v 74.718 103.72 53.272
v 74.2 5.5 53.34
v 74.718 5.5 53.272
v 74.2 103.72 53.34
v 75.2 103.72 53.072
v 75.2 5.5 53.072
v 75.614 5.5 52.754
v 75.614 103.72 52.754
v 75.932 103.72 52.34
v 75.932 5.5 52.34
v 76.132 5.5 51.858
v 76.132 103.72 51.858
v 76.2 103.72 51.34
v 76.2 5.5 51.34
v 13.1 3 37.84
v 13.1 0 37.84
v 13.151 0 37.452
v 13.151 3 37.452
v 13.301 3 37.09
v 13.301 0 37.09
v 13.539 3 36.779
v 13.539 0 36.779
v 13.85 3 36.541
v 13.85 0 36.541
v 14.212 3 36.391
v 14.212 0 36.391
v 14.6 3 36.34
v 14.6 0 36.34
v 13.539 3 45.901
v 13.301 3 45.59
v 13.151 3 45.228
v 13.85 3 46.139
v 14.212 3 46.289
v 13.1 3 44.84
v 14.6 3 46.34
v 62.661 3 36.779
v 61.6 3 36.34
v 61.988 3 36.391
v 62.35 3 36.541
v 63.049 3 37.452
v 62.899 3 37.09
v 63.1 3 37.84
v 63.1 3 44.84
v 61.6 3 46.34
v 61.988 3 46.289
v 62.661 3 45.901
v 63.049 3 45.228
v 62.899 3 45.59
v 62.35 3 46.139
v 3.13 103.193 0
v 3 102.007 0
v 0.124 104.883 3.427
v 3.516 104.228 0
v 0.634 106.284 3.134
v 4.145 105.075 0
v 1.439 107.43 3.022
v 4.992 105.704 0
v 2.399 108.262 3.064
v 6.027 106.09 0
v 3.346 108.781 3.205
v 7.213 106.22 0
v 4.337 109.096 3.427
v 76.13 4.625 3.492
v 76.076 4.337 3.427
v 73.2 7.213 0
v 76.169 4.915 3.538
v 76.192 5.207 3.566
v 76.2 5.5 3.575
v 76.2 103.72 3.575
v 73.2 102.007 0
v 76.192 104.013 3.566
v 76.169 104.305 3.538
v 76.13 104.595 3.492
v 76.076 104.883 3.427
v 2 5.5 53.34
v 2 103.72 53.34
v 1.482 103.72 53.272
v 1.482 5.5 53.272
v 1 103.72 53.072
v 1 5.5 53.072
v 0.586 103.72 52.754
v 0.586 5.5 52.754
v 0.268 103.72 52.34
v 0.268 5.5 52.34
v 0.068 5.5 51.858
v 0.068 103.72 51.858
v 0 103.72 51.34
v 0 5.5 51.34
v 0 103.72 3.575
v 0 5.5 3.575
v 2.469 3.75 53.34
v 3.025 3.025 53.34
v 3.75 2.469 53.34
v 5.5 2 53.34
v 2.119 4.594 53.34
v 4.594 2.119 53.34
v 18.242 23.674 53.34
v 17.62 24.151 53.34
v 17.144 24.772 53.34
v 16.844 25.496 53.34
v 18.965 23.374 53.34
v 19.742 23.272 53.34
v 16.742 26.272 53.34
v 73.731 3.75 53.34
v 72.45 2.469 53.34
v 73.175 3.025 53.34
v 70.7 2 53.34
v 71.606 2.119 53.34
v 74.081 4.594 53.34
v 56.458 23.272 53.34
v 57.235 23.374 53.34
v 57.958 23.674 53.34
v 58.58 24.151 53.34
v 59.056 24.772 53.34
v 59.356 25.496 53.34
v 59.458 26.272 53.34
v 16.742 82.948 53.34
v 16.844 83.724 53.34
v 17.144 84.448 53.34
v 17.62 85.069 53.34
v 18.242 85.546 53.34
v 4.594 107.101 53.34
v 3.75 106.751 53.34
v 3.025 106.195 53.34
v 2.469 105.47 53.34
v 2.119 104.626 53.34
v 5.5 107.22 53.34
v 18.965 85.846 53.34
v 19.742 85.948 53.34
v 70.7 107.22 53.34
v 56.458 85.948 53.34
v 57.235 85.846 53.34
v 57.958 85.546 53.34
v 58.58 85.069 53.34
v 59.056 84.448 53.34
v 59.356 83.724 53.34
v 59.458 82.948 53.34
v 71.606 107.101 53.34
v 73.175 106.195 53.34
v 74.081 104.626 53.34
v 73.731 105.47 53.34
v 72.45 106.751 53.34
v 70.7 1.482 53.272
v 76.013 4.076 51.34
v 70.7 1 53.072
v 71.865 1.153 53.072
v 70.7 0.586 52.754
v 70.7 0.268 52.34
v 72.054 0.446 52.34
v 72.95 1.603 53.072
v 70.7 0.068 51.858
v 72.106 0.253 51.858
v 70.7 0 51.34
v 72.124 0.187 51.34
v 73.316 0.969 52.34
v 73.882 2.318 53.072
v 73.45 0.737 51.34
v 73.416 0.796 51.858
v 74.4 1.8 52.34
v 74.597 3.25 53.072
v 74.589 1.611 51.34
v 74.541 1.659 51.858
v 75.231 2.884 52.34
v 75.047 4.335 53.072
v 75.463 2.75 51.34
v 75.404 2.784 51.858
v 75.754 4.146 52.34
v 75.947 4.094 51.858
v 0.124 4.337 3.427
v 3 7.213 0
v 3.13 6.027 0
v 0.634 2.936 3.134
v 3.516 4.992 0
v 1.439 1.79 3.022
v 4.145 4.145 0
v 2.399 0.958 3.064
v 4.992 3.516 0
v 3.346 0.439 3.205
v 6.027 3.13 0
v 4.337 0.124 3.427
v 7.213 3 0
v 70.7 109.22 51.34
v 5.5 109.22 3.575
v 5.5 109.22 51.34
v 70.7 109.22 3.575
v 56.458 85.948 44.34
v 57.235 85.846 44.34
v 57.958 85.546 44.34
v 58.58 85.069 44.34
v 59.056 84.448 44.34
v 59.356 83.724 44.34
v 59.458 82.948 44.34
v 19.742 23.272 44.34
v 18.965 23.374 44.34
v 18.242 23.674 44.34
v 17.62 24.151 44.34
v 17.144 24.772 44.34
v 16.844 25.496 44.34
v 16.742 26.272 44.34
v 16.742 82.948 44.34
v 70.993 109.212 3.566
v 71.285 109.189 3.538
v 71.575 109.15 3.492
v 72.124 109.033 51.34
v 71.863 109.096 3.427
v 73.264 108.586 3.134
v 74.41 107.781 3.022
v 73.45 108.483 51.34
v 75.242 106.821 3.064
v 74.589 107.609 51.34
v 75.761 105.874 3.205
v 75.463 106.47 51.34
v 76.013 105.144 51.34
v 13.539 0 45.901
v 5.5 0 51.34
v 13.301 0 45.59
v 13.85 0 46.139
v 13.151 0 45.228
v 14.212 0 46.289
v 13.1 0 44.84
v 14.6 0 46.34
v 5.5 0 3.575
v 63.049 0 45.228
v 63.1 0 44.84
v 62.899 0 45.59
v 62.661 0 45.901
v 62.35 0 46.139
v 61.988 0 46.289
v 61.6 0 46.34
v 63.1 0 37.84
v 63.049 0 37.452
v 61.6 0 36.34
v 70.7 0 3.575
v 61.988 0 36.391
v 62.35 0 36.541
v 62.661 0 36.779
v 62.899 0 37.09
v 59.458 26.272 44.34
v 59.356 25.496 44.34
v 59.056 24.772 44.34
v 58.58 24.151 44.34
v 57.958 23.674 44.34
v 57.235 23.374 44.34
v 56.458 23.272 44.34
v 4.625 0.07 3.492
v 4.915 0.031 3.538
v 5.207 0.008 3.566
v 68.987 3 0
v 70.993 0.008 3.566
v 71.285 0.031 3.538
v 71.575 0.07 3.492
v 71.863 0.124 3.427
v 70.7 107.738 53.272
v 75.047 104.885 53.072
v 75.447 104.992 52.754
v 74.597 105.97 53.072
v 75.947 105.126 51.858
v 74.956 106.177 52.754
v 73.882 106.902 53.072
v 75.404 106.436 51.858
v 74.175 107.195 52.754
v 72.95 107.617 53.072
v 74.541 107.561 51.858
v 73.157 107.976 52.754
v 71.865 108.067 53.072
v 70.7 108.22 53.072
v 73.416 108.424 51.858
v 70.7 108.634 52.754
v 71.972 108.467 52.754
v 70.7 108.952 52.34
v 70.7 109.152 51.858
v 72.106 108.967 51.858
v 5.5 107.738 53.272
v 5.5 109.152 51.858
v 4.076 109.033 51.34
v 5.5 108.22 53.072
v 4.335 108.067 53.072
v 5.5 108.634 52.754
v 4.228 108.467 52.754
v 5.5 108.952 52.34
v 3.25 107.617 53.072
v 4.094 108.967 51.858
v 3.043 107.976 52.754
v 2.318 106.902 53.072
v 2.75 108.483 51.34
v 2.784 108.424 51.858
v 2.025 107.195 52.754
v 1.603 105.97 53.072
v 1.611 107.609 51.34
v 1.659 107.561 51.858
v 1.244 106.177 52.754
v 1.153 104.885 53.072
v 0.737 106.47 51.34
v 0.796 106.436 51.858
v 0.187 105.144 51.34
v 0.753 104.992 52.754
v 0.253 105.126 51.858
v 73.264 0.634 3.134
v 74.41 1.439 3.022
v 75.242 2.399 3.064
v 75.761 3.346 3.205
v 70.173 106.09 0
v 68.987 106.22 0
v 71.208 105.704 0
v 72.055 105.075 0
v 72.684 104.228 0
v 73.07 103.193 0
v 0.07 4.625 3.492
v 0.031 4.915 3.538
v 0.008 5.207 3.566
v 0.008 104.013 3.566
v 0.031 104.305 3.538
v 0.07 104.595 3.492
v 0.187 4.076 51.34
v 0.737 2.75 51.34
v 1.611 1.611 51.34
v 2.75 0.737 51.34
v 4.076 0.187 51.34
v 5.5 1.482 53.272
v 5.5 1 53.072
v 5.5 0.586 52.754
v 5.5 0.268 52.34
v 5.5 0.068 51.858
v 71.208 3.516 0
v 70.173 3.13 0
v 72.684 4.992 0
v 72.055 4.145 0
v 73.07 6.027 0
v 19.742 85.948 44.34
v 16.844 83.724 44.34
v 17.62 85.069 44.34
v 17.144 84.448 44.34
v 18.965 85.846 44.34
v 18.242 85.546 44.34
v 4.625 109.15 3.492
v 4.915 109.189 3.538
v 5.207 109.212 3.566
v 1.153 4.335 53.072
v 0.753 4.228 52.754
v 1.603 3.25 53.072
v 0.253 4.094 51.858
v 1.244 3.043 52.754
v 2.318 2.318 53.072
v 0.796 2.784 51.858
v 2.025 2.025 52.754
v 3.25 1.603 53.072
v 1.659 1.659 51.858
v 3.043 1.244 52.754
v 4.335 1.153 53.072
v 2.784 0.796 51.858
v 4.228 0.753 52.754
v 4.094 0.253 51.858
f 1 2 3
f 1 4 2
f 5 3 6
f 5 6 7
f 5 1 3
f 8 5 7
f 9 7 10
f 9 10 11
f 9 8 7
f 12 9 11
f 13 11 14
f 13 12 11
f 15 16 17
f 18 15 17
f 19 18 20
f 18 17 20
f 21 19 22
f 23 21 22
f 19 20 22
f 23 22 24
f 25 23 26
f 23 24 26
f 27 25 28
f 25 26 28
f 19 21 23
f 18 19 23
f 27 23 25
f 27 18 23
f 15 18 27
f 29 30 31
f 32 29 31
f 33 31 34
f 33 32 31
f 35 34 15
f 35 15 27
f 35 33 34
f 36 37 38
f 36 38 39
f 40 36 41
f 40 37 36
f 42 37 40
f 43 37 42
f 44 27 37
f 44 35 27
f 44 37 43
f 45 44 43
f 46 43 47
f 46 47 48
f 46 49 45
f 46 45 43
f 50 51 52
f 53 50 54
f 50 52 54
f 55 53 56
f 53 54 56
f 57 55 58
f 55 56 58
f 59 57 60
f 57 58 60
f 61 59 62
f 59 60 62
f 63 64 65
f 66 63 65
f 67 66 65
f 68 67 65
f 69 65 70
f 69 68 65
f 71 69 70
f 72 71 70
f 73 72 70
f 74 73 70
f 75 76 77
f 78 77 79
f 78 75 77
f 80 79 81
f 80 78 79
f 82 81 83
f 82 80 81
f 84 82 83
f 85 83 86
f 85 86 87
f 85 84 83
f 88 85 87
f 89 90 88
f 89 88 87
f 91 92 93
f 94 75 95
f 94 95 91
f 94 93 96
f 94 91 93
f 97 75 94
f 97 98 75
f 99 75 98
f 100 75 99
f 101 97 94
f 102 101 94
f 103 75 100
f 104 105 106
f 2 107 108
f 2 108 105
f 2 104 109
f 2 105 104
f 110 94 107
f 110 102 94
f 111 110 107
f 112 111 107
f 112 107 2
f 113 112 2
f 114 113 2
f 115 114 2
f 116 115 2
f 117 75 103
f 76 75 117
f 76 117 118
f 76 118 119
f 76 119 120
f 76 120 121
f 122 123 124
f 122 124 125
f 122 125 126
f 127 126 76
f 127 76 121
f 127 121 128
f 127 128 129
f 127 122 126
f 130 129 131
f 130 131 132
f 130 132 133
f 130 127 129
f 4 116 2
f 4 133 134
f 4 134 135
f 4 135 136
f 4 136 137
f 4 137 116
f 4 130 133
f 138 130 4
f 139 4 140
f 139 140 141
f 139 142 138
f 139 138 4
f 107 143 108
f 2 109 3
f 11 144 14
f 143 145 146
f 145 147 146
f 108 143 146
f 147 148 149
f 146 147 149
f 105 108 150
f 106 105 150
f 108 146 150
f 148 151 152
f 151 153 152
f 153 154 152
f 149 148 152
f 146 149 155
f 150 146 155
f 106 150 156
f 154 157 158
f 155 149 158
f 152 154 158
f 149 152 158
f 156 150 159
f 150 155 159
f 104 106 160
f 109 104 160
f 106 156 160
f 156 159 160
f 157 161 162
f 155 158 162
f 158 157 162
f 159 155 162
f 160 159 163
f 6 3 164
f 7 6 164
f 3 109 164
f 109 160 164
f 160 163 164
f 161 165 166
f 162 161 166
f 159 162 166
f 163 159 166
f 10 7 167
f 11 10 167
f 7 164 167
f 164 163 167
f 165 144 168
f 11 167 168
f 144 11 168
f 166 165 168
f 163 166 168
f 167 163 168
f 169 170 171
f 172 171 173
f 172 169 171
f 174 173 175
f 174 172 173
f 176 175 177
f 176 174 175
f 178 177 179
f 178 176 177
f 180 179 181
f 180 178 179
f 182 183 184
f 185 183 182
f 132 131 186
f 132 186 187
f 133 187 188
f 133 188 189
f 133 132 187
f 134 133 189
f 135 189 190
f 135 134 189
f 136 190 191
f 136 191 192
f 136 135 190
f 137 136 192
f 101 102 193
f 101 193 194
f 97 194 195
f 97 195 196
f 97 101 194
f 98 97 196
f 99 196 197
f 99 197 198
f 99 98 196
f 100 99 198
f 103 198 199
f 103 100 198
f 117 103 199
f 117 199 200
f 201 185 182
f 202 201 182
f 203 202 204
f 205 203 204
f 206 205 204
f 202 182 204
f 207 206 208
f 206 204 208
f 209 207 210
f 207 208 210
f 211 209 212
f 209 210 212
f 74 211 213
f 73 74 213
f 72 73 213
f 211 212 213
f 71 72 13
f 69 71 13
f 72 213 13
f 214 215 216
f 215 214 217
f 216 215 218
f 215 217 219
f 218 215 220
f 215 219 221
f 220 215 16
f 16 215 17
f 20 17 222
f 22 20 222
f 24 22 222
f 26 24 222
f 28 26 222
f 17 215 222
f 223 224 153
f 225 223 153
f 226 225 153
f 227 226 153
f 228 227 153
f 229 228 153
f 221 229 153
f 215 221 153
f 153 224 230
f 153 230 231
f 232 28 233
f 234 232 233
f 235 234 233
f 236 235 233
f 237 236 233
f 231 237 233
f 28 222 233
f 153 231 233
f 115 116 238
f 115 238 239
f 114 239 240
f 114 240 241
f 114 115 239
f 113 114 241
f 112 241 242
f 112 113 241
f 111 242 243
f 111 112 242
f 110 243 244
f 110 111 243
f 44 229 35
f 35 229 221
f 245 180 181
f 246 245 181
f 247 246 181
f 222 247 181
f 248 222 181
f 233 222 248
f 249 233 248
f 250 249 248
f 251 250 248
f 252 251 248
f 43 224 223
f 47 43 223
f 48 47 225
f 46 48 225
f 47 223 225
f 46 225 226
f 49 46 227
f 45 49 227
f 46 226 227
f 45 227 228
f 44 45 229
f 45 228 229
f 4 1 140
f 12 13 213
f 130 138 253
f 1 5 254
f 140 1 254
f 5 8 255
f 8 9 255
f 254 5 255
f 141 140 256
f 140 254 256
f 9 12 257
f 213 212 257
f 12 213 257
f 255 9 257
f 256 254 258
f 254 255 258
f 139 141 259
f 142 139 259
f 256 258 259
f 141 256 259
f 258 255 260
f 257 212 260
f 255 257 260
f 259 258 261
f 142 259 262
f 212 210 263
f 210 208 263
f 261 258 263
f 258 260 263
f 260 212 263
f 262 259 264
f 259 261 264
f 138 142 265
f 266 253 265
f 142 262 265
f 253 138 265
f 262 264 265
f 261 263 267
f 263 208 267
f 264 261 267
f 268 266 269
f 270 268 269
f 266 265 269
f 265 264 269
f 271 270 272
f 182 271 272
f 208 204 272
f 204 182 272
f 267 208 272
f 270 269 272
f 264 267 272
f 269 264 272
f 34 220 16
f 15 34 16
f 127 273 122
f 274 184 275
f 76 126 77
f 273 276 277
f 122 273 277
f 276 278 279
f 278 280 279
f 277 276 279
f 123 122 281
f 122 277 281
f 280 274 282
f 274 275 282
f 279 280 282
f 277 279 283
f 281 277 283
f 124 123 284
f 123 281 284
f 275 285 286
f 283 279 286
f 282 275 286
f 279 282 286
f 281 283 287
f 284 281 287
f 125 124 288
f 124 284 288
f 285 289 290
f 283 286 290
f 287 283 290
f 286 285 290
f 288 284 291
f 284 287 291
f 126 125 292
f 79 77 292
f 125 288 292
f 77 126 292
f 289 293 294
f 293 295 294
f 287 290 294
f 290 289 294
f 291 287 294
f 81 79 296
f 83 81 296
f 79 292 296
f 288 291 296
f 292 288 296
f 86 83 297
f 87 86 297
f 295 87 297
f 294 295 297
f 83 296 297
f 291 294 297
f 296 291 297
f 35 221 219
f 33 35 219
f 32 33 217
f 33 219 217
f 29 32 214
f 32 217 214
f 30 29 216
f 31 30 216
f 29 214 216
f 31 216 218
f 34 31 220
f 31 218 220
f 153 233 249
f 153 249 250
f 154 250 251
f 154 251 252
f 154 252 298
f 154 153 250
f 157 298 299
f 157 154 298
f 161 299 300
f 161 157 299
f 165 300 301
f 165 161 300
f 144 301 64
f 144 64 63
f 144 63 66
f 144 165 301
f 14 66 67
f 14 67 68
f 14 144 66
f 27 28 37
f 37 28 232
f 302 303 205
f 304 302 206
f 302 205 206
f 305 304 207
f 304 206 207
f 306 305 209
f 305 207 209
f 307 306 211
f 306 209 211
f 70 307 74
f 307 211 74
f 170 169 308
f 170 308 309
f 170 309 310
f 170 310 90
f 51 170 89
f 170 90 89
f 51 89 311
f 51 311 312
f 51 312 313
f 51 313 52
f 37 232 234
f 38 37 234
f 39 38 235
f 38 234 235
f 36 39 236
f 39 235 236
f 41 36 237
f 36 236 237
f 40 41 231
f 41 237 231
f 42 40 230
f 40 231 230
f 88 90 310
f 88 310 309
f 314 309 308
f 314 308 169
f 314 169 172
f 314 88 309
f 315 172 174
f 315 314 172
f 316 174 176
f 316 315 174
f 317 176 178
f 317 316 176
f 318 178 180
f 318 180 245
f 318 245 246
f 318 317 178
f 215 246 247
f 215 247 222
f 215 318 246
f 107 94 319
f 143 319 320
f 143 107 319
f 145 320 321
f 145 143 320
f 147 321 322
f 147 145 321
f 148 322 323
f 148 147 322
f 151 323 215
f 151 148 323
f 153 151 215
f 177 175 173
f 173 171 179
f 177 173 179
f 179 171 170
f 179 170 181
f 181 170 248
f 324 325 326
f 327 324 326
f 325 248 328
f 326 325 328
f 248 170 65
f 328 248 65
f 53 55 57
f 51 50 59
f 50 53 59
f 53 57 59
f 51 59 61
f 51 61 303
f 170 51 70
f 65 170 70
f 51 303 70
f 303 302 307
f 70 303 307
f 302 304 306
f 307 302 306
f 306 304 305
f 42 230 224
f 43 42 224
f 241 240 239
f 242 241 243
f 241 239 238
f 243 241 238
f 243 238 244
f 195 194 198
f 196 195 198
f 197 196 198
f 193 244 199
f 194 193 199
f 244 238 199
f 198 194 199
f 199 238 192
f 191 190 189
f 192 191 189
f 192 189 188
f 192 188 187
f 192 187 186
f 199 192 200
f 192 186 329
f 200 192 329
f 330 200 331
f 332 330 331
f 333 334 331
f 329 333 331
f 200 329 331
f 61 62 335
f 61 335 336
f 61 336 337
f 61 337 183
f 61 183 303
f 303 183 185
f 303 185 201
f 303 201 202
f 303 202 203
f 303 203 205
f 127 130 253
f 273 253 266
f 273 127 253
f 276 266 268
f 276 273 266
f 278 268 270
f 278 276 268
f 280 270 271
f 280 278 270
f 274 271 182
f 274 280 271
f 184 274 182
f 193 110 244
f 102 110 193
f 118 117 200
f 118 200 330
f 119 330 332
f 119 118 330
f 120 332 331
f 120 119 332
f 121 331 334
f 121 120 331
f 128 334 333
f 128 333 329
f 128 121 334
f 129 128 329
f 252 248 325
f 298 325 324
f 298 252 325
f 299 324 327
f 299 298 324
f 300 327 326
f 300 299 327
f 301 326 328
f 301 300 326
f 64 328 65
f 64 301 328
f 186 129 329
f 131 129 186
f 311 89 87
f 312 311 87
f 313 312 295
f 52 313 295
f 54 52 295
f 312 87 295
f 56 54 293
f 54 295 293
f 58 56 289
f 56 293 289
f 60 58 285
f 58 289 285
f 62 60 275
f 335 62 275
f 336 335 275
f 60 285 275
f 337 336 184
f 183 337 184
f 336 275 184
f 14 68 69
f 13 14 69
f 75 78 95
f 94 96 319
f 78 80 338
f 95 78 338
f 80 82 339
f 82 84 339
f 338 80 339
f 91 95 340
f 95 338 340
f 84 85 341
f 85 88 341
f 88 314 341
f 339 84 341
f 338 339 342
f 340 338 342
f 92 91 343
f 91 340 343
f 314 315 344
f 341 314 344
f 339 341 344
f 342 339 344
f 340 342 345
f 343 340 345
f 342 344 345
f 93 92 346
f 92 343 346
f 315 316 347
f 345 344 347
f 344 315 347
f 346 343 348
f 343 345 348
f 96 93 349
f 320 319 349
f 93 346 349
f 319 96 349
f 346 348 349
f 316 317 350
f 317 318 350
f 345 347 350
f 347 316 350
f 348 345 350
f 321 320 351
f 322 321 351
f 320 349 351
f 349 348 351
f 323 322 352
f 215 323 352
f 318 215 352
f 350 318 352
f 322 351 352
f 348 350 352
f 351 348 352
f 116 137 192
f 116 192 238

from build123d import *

# Parameters (mm, degrees)
SKETCH2_W           = 76.2
SKETCH2_H           = 109.22
BOSS_EXTRUDE1_DEPTH = 53.34
CHAMFER1_SIZE       = 3
CHAMFER1_SIZE2      = 3.575260778
CHAMFER2_SIZE       = 3
CHAMFER2_SIZE2      = 3.575260778
FILLET2_R           = 5.5
FILLET3_R           = 5.5
FILLET4_R           = 2
CUT_EXTRUDE1_DEPTH  = 9
CUT_EXTRUDE2_DEPTH  = 3


with BuildPart() as part:
    # Sketch2 → Boss-Extrude1 (new body)
    with BuildSketch(Plane.XY):
        with Locations((38.1, 54.61)):
            Rectangle(SKETCH2_W, SKETCH2_H)
    extrude(amount=BOSS_EXTRUDE1_DEPTH)

    # Chamfer1
    chamfer1_edges = [part.edges().sort_by_distance(p)[0] for p in [
        (38.1, 109.22, 0),
    ]]
    chamfer1_side = [part.faces().sort_by_distance(p)[0] for p in [
        (38.1, 54.61, 0),
    ]]
    chamfer(chamfer1_edges, length=CHAMFER1_SIZE, length2=CHAMFER1_SIZE2, reference=chamfer1_side[0])

    # Chamfer2
    chamfer2_edges = [part.edges().sort_by_distance(p)[0] for p in [
        (0, 53.11, 0),
        (38.1, 0, 0),
        (76.2, 53.11, 0),
    ]]
    chamfer2_side = [part.faces().sort_by_distance(p)[0] for p in [
        (38.1, 53.11, 0),
    ]]
    chamfer(chamfer2_edges, length=CHAMFER2_SIZE, length2=CHAMFER2_SIZE2, reference=chamfer2_side[0])

    # Fillet2
    fillet2_edges = [part.edges().sort_by_distance(p)[0] for p in [
        (74.7, 107.72, 1.787630389),
        (1.5, 107.72, 1.787630389),
        (74.7, 1.5, 1.787630389),
        (1.5, 1.5, 1.787630389),
    ]]
    fillet(fillet2_edges, radius=FILLET2_R)

    # Fillet3
    fillet3_edges = [part.edges().sort_by_distance(p)[0] for p in [
        (76.2, 0, 29.139633853),
        (0, 0, 29.139633853),
        (0, 109.22, 29.139633853),
        (76.2, 109.22, 29.139633853),
    ]]
    fillet(fillet3_edges, radius=FILLET3_R - 0.0001)  # a hair under: the kernel refuses the full size

    # Fillet4
    fillet4_edges = [part.edges().sort_by_distance(p)[0] for p in [
        (76.2, 54.61, 53.34),
        (38.1, 0, 53.34),
        (0, 54.61, 53.34),
        (38.1, 109.22, 53.34),
        (74.589116586, 107.609116586, 53.34),
        (1.610883414, 107.609116586, 53.34),
        (1.610883414, 1.610883414, 53.34),
        (74.589116586, 1.610883414, 53.34),
    ]]
    fillet(fillet4_edges, radius=FILLET4_R)

    # Sketch4 → Cut-Extrude1 (cut)
    with BuildSketch(Plane.XY.offset(53.34)):
        with BuildLine():
            Line((19.741636299, 85.947770103), (56.458363701, 85.947770103))
            ThreePointArc((56.458363701, 85.947770103), (58.579684045, 85.069090446), (59.458363701, 82.947770103))
            Line((59.458363701, 82.947770103), (59.458363701, 26.272229897))
            ThreePointArc((59.458363701, 26.272229897), (58.579684045, 24.150909554), (56.458363701, 23.272229897))
            Line((56.458363701, 23.272229897), (19.741636299, 23.272229897))
            ThreePointArc((19.741636299, 23.272229897), (17.620315955, 24.150909554), (16.741636299, 26.272229897))
            Line((16.741636299, 26.272229897), (16.741636299, 82.947770103))
            ThreePointArc((16.741636299, 82.947770103), (17.620315955, 85.069090446), (19.741636299, 85.947770103))
        make_face()
    extrude(amount=-CUT_EXTRUDE1_DEPTH, mode=Mode.SUBTRACT)

    # Sketch5 → Cut-Extrude2 (cut)
    with BuildSketch(Plane.XZ):
        with BuildLine():
            Line((14.6, 36.34), (61.6, 36.34))
            ThreePointArc((61.6, 36.34), (62.660660172, 36.779339828), (63.1, 37.84))
            Line((63.1, 37.84), (63.1, 44.84))
            ThreePointArc((63.1, 44.84), (62.660660172, 45.900660172), (61.6, 46.34))
            Line((61.6, 46.34), (14.6, 46.34))
            ThreePointArc((14.6, 46.34), (13.539339828, 45.900660172), (13.1, 44.84))
            Line((13.1, 44.84), (13.1, 37.84))
            ThreePointArc((13.1, 37.84), (13.539339828, 36.779339828), (14.6, 36.34))
        make_face()
    extrude(amount=-CUT_EXTRUDE2_DEPTH, mode=Mode.SUBTRACT)


solid = part.part
